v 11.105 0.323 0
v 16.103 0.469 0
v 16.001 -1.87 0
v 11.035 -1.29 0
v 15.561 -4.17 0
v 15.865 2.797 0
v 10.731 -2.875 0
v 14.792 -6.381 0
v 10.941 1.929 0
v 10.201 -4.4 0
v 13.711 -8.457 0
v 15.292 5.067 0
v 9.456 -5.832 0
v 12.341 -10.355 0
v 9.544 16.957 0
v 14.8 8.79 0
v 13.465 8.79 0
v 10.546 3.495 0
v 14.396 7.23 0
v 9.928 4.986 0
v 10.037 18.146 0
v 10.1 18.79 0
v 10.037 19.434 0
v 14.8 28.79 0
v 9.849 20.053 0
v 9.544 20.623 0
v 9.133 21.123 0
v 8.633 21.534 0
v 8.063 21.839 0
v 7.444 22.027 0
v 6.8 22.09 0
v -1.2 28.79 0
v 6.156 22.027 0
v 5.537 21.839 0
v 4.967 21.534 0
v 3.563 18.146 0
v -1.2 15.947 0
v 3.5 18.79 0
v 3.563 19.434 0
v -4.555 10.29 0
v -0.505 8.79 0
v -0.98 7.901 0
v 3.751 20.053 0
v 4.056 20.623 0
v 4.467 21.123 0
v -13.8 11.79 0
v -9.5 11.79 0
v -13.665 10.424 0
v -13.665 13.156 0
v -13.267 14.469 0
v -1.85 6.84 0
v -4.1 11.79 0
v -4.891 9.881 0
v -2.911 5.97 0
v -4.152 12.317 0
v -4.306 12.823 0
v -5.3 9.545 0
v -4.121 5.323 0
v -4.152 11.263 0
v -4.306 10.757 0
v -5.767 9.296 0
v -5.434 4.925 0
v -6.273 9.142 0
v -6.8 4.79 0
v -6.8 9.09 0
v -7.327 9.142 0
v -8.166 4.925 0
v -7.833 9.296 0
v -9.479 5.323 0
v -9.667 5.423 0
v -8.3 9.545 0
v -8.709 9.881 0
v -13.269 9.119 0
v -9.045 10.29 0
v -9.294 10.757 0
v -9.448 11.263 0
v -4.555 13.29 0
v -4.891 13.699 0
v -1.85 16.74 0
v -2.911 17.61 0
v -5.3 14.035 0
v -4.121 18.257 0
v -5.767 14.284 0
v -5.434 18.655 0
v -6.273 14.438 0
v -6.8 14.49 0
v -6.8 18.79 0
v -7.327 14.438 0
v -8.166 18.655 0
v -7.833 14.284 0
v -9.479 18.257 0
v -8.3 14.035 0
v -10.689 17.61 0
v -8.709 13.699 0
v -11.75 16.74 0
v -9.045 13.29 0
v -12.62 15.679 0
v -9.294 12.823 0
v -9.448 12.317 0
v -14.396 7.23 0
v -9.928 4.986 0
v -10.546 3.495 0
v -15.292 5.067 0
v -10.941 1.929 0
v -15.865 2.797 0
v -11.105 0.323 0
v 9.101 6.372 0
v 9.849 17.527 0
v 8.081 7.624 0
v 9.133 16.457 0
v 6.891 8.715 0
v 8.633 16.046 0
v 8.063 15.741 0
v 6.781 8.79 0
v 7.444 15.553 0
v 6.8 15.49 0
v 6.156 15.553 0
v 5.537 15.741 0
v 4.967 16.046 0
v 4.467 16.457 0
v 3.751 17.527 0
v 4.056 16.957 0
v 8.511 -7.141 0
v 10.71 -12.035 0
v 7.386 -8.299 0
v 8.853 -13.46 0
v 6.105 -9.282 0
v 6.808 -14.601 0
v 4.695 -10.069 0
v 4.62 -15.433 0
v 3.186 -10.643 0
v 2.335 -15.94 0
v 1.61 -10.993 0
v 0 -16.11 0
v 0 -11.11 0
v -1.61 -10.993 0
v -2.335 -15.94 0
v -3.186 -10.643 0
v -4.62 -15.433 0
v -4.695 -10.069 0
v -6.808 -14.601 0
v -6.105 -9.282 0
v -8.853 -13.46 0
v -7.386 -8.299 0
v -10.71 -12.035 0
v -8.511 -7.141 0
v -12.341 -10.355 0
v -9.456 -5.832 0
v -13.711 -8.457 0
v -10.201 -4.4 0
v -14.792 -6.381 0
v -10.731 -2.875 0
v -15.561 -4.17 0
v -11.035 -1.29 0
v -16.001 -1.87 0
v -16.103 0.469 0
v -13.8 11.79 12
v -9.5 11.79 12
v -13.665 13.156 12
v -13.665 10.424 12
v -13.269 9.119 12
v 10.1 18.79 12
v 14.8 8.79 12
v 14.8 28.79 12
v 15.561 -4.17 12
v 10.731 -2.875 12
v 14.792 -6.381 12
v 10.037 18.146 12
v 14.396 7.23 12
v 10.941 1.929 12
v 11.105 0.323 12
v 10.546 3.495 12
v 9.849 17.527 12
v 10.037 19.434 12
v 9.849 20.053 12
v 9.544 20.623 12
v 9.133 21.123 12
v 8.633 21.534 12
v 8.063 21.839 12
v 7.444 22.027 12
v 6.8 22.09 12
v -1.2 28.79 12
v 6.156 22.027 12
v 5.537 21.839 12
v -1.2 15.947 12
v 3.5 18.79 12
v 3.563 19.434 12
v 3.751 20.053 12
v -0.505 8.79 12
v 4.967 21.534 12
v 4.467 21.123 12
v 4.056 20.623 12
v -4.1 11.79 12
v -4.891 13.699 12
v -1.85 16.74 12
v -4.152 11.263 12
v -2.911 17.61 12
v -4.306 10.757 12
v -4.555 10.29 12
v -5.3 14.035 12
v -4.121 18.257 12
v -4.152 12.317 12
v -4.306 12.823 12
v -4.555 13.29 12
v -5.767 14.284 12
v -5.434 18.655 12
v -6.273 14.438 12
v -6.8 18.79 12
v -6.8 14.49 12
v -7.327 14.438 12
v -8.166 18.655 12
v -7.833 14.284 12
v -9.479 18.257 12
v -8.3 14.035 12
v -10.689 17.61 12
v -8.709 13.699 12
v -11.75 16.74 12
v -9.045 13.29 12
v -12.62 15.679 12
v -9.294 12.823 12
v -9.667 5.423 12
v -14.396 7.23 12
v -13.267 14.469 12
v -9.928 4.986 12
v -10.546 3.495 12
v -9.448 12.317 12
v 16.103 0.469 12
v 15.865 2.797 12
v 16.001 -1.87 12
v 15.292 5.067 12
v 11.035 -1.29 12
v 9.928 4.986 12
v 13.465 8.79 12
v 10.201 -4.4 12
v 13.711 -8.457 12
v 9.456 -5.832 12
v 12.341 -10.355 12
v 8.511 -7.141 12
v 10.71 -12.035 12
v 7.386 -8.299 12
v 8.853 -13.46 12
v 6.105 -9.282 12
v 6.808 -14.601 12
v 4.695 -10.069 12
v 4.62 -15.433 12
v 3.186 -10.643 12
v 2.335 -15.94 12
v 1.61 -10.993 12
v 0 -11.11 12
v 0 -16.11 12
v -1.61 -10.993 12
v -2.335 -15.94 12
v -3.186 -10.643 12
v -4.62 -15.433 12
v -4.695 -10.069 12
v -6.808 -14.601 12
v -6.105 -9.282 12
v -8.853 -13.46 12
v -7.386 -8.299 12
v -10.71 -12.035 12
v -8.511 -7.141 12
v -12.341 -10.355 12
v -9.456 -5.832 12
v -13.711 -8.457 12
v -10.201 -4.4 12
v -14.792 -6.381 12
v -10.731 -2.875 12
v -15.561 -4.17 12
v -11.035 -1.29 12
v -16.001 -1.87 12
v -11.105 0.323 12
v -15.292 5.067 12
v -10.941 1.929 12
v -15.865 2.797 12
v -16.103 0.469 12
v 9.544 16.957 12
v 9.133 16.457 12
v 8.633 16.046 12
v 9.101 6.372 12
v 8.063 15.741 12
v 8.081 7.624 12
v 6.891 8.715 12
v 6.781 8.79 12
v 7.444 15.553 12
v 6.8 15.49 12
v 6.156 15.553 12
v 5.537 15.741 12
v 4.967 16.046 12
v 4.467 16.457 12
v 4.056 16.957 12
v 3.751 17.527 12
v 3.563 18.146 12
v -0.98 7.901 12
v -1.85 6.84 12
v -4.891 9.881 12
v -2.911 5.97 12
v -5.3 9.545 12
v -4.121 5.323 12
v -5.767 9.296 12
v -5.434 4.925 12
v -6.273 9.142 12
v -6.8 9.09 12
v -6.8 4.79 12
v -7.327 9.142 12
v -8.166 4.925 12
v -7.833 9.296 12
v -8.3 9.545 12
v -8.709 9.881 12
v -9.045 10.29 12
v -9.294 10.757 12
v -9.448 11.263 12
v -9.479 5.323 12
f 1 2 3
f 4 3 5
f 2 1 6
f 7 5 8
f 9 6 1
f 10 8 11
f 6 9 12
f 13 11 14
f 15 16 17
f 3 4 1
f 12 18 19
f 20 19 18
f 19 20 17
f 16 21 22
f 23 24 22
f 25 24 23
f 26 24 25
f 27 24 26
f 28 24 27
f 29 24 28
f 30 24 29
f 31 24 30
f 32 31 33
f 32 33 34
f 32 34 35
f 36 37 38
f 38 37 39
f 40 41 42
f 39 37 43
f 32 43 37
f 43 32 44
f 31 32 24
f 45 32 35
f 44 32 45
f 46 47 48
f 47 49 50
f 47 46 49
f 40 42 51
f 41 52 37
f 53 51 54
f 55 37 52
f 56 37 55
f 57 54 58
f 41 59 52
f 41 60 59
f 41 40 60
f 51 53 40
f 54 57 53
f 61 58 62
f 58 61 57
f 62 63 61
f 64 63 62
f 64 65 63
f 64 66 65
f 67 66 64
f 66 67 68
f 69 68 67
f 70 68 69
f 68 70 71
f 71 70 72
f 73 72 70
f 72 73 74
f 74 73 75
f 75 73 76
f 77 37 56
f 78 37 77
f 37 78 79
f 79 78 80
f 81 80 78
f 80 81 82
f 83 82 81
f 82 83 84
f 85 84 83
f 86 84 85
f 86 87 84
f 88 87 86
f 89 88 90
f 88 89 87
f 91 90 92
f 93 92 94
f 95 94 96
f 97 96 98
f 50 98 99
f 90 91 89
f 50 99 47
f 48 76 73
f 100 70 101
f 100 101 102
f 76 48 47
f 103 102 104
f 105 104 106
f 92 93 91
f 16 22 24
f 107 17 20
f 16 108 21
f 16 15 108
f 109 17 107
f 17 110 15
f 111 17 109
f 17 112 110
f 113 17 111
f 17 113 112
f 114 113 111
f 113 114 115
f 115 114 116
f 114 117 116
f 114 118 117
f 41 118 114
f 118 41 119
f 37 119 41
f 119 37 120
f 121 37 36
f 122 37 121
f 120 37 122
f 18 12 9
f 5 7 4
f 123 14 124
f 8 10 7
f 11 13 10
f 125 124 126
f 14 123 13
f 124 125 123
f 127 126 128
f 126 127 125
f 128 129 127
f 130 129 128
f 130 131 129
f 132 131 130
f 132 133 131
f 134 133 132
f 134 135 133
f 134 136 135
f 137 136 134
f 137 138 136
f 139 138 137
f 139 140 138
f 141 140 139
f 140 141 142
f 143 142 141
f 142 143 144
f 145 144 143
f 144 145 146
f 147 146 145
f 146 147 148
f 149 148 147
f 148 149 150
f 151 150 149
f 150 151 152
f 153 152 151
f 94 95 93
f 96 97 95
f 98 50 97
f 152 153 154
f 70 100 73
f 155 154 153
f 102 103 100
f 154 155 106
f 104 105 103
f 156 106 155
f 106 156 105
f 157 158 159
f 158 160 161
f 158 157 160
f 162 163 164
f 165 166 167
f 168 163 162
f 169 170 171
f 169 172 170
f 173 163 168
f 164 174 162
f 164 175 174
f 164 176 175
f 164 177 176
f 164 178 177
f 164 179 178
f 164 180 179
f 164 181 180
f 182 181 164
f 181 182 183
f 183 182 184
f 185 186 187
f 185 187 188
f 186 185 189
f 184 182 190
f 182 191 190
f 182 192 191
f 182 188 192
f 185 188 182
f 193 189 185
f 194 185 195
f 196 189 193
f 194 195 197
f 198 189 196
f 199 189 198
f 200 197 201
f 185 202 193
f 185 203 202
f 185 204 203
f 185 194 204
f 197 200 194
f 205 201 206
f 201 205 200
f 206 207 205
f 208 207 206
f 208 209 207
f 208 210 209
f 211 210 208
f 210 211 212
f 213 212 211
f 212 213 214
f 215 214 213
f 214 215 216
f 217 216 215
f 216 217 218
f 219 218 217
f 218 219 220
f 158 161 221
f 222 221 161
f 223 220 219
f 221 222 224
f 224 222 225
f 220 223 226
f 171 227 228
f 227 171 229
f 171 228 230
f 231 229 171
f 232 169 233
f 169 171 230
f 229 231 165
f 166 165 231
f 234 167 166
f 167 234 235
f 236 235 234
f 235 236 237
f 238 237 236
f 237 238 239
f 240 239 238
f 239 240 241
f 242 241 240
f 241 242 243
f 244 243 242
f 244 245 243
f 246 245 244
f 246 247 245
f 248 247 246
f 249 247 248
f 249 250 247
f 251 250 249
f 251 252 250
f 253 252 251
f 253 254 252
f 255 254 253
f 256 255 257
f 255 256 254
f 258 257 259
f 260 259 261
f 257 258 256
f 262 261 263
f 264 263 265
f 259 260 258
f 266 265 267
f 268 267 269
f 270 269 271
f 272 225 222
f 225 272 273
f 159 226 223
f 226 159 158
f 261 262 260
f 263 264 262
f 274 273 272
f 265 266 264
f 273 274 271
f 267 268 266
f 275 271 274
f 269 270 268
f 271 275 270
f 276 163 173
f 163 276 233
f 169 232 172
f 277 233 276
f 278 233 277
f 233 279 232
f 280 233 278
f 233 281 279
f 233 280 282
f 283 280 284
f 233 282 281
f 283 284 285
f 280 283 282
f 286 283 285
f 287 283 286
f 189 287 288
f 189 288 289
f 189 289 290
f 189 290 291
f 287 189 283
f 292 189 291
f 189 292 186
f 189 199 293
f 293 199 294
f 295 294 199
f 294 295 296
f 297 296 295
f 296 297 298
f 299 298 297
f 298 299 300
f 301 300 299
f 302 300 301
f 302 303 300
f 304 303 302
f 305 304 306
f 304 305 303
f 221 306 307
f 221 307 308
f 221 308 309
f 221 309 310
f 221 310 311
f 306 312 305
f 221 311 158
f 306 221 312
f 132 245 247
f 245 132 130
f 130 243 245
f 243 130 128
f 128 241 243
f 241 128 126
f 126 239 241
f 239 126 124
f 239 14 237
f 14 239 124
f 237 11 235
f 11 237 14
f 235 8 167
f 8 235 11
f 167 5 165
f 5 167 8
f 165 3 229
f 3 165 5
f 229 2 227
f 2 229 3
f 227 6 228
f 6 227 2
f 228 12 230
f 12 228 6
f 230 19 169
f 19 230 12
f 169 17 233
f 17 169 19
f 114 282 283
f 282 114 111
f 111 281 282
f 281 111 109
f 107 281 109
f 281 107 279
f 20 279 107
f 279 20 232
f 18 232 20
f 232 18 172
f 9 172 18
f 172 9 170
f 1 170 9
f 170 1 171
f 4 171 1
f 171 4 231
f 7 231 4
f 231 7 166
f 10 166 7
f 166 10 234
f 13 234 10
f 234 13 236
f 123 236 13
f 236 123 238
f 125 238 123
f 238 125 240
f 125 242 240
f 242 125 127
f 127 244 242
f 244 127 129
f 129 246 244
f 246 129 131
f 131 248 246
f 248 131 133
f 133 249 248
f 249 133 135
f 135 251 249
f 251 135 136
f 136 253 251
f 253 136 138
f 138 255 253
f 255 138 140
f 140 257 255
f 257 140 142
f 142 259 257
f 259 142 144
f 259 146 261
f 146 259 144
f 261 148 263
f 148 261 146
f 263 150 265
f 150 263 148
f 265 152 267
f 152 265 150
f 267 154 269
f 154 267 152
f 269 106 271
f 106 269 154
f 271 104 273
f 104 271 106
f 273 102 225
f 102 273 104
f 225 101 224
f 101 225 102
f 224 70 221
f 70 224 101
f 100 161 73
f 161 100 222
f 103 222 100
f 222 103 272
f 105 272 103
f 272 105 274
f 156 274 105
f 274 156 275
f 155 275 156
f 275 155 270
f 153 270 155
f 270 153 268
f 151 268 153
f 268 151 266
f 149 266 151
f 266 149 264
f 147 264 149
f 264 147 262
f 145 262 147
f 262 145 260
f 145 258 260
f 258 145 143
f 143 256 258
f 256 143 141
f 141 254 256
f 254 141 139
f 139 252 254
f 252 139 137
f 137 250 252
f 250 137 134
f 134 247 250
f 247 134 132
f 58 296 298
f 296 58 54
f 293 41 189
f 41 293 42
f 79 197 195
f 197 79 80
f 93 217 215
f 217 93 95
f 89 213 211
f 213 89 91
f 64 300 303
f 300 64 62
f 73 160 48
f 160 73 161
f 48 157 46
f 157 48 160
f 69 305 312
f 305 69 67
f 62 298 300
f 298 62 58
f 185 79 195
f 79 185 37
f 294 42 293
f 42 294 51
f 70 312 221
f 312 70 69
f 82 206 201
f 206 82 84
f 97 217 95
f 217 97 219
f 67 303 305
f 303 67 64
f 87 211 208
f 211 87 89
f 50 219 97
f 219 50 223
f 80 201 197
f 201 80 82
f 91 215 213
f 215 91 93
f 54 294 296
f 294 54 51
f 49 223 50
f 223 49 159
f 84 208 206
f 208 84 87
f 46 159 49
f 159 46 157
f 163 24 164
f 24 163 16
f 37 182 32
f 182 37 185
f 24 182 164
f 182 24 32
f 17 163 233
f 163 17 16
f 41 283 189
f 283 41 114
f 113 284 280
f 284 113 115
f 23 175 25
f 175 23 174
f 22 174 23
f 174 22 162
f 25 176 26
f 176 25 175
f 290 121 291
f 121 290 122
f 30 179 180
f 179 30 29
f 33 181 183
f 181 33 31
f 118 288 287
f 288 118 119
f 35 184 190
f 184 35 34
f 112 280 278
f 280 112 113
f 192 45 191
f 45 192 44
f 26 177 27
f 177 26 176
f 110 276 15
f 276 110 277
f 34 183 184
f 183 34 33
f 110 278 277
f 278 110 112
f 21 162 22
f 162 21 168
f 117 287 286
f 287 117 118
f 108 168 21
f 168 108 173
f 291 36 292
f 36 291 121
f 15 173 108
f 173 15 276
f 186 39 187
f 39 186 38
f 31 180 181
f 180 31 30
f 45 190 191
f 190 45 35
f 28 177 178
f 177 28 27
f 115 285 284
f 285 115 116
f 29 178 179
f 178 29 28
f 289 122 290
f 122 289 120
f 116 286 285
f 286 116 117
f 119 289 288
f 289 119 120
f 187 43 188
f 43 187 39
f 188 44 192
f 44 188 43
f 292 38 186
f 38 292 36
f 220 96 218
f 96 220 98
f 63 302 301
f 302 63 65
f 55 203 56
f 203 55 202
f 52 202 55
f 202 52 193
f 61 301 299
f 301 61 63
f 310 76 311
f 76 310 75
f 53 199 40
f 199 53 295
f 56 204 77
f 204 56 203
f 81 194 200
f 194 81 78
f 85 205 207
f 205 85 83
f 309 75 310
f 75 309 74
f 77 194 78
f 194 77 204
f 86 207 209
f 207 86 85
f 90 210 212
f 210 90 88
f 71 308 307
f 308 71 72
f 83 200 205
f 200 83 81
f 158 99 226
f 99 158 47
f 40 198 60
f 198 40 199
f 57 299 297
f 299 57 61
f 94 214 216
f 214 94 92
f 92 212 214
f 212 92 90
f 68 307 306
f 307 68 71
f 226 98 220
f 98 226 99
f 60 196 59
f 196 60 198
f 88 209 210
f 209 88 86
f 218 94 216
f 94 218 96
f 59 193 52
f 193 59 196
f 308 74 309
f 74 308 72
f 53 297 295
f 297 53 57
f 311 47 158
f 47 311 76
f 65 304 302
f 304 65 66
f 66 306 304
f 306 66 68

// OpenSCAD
$fn = 32;

// ----------------------------------------------------------------------
// Pipe clamp: 32.22 mm ring, 5 mm wall, 12 mm wide
// ----------------------------------------------------------------------

// --- parameters (mm) ---
outer_r = 16.11;          // clamp outside radius
inner_r = 11.11;          // pipe bore radius
band = 5;                 // band thickness
clamp_w = 12;             // clamp width
opening = 60;             // opening angle between the ends
lug_w = 16;               // lug width
lug_len = 20;             // lug length
bolt_d = 6.6;             // bolt hole
knuckle_d = 14;           // hinge knuckle diameter
pin_d = 5.4;              // hinge pin hole

clamp_profile = [[-8.055, 13.952], [-9.992, 12.637], [-11.718, 11.055], [-13.197, 9.24], [-14.396, 7.23], [-15.292, 5.067], [-15.865, 2.797], [-16.103, 0.469], [-16.001, -1.87], [-15.561, -4.17], [-14.792, -6.381], [-13.711, -8.457], [-12.341, -10.355], [-10.71, -12.035], [-8.853, -13.46], [-6.808, -14.601], [-4.62, -15.433], [-2.335, -15.94], [0, -16.11], [2.335, -15.94], [4.62, -15.433], [6.808, -14.601], [8.853, -13.46], [10.71, -12.035], [12.341, -10.355], [13.711, -8.457], [14.792, -6.381], [15.561, -4.17], [16.001, -1.87], [16.103, 0.469], [15.865, 2.797], [15.292, 5.067], [14.396, 7.23], [13.197, 9.24], [11.718, 11.055], [9.992, 12.637], [8.055, 13.952], [5.555, 9.622], [6.891, 8.715], [8.081, 7.624], [9.101, 6.372], [9.928, 4.986], [10.546, 3.495], [10.941, 1.929], [11.105, 0.323], [11.035, -1.29], [10.731, -2.875], [10.201, -4.4], [9.456, -5.832], [8.511, -7.141], [7.386, -8.299], [6.105, -9.282], [4.695, -10.069], [3.186, -10.643], [1.61, -10.993], [0, -11.11], [-1.61, -10.993], [-3.186, -10.643], [-4.695, -10.069], [-6.105, -9.282], [-7.386, -8.299], [-8.511, -7.141], [-9.456, -5.832], [-10.201, -4.4], [-10.731, -2.875], [-11.035, -1.29], [-11.105, 0.323], [-10.941, 1.929], [-10.546, 3.495], [-9.928, 4.986], [-9.101, 6.372], [-8.081, 7.624], [-6.891, 8.715], [-5.555, 9.622]];

difference() {
  union() {
    linear_extrude(height = clamp_w) polygon(clamp_profile);
    /* hinge knuckle, sunk 2 mm into the band end */
    translate([-6.8, 11.79, 0]) cylinder(h = clamp_w, d = knuckle_d);
    /* bolt lug on the other end */
    translate([-1.2, 8.79, 0]) cube([lug_w, 20, clamp_w]);
  }
  translate([6.8, 18.79, -2.5]) cylinder(h = clamp_w + 5, d = bolt_d);
  translate([-6.8, 11.79, -2.5]) cylinder(h = clamp_w + 5, d = pin_d);
}
